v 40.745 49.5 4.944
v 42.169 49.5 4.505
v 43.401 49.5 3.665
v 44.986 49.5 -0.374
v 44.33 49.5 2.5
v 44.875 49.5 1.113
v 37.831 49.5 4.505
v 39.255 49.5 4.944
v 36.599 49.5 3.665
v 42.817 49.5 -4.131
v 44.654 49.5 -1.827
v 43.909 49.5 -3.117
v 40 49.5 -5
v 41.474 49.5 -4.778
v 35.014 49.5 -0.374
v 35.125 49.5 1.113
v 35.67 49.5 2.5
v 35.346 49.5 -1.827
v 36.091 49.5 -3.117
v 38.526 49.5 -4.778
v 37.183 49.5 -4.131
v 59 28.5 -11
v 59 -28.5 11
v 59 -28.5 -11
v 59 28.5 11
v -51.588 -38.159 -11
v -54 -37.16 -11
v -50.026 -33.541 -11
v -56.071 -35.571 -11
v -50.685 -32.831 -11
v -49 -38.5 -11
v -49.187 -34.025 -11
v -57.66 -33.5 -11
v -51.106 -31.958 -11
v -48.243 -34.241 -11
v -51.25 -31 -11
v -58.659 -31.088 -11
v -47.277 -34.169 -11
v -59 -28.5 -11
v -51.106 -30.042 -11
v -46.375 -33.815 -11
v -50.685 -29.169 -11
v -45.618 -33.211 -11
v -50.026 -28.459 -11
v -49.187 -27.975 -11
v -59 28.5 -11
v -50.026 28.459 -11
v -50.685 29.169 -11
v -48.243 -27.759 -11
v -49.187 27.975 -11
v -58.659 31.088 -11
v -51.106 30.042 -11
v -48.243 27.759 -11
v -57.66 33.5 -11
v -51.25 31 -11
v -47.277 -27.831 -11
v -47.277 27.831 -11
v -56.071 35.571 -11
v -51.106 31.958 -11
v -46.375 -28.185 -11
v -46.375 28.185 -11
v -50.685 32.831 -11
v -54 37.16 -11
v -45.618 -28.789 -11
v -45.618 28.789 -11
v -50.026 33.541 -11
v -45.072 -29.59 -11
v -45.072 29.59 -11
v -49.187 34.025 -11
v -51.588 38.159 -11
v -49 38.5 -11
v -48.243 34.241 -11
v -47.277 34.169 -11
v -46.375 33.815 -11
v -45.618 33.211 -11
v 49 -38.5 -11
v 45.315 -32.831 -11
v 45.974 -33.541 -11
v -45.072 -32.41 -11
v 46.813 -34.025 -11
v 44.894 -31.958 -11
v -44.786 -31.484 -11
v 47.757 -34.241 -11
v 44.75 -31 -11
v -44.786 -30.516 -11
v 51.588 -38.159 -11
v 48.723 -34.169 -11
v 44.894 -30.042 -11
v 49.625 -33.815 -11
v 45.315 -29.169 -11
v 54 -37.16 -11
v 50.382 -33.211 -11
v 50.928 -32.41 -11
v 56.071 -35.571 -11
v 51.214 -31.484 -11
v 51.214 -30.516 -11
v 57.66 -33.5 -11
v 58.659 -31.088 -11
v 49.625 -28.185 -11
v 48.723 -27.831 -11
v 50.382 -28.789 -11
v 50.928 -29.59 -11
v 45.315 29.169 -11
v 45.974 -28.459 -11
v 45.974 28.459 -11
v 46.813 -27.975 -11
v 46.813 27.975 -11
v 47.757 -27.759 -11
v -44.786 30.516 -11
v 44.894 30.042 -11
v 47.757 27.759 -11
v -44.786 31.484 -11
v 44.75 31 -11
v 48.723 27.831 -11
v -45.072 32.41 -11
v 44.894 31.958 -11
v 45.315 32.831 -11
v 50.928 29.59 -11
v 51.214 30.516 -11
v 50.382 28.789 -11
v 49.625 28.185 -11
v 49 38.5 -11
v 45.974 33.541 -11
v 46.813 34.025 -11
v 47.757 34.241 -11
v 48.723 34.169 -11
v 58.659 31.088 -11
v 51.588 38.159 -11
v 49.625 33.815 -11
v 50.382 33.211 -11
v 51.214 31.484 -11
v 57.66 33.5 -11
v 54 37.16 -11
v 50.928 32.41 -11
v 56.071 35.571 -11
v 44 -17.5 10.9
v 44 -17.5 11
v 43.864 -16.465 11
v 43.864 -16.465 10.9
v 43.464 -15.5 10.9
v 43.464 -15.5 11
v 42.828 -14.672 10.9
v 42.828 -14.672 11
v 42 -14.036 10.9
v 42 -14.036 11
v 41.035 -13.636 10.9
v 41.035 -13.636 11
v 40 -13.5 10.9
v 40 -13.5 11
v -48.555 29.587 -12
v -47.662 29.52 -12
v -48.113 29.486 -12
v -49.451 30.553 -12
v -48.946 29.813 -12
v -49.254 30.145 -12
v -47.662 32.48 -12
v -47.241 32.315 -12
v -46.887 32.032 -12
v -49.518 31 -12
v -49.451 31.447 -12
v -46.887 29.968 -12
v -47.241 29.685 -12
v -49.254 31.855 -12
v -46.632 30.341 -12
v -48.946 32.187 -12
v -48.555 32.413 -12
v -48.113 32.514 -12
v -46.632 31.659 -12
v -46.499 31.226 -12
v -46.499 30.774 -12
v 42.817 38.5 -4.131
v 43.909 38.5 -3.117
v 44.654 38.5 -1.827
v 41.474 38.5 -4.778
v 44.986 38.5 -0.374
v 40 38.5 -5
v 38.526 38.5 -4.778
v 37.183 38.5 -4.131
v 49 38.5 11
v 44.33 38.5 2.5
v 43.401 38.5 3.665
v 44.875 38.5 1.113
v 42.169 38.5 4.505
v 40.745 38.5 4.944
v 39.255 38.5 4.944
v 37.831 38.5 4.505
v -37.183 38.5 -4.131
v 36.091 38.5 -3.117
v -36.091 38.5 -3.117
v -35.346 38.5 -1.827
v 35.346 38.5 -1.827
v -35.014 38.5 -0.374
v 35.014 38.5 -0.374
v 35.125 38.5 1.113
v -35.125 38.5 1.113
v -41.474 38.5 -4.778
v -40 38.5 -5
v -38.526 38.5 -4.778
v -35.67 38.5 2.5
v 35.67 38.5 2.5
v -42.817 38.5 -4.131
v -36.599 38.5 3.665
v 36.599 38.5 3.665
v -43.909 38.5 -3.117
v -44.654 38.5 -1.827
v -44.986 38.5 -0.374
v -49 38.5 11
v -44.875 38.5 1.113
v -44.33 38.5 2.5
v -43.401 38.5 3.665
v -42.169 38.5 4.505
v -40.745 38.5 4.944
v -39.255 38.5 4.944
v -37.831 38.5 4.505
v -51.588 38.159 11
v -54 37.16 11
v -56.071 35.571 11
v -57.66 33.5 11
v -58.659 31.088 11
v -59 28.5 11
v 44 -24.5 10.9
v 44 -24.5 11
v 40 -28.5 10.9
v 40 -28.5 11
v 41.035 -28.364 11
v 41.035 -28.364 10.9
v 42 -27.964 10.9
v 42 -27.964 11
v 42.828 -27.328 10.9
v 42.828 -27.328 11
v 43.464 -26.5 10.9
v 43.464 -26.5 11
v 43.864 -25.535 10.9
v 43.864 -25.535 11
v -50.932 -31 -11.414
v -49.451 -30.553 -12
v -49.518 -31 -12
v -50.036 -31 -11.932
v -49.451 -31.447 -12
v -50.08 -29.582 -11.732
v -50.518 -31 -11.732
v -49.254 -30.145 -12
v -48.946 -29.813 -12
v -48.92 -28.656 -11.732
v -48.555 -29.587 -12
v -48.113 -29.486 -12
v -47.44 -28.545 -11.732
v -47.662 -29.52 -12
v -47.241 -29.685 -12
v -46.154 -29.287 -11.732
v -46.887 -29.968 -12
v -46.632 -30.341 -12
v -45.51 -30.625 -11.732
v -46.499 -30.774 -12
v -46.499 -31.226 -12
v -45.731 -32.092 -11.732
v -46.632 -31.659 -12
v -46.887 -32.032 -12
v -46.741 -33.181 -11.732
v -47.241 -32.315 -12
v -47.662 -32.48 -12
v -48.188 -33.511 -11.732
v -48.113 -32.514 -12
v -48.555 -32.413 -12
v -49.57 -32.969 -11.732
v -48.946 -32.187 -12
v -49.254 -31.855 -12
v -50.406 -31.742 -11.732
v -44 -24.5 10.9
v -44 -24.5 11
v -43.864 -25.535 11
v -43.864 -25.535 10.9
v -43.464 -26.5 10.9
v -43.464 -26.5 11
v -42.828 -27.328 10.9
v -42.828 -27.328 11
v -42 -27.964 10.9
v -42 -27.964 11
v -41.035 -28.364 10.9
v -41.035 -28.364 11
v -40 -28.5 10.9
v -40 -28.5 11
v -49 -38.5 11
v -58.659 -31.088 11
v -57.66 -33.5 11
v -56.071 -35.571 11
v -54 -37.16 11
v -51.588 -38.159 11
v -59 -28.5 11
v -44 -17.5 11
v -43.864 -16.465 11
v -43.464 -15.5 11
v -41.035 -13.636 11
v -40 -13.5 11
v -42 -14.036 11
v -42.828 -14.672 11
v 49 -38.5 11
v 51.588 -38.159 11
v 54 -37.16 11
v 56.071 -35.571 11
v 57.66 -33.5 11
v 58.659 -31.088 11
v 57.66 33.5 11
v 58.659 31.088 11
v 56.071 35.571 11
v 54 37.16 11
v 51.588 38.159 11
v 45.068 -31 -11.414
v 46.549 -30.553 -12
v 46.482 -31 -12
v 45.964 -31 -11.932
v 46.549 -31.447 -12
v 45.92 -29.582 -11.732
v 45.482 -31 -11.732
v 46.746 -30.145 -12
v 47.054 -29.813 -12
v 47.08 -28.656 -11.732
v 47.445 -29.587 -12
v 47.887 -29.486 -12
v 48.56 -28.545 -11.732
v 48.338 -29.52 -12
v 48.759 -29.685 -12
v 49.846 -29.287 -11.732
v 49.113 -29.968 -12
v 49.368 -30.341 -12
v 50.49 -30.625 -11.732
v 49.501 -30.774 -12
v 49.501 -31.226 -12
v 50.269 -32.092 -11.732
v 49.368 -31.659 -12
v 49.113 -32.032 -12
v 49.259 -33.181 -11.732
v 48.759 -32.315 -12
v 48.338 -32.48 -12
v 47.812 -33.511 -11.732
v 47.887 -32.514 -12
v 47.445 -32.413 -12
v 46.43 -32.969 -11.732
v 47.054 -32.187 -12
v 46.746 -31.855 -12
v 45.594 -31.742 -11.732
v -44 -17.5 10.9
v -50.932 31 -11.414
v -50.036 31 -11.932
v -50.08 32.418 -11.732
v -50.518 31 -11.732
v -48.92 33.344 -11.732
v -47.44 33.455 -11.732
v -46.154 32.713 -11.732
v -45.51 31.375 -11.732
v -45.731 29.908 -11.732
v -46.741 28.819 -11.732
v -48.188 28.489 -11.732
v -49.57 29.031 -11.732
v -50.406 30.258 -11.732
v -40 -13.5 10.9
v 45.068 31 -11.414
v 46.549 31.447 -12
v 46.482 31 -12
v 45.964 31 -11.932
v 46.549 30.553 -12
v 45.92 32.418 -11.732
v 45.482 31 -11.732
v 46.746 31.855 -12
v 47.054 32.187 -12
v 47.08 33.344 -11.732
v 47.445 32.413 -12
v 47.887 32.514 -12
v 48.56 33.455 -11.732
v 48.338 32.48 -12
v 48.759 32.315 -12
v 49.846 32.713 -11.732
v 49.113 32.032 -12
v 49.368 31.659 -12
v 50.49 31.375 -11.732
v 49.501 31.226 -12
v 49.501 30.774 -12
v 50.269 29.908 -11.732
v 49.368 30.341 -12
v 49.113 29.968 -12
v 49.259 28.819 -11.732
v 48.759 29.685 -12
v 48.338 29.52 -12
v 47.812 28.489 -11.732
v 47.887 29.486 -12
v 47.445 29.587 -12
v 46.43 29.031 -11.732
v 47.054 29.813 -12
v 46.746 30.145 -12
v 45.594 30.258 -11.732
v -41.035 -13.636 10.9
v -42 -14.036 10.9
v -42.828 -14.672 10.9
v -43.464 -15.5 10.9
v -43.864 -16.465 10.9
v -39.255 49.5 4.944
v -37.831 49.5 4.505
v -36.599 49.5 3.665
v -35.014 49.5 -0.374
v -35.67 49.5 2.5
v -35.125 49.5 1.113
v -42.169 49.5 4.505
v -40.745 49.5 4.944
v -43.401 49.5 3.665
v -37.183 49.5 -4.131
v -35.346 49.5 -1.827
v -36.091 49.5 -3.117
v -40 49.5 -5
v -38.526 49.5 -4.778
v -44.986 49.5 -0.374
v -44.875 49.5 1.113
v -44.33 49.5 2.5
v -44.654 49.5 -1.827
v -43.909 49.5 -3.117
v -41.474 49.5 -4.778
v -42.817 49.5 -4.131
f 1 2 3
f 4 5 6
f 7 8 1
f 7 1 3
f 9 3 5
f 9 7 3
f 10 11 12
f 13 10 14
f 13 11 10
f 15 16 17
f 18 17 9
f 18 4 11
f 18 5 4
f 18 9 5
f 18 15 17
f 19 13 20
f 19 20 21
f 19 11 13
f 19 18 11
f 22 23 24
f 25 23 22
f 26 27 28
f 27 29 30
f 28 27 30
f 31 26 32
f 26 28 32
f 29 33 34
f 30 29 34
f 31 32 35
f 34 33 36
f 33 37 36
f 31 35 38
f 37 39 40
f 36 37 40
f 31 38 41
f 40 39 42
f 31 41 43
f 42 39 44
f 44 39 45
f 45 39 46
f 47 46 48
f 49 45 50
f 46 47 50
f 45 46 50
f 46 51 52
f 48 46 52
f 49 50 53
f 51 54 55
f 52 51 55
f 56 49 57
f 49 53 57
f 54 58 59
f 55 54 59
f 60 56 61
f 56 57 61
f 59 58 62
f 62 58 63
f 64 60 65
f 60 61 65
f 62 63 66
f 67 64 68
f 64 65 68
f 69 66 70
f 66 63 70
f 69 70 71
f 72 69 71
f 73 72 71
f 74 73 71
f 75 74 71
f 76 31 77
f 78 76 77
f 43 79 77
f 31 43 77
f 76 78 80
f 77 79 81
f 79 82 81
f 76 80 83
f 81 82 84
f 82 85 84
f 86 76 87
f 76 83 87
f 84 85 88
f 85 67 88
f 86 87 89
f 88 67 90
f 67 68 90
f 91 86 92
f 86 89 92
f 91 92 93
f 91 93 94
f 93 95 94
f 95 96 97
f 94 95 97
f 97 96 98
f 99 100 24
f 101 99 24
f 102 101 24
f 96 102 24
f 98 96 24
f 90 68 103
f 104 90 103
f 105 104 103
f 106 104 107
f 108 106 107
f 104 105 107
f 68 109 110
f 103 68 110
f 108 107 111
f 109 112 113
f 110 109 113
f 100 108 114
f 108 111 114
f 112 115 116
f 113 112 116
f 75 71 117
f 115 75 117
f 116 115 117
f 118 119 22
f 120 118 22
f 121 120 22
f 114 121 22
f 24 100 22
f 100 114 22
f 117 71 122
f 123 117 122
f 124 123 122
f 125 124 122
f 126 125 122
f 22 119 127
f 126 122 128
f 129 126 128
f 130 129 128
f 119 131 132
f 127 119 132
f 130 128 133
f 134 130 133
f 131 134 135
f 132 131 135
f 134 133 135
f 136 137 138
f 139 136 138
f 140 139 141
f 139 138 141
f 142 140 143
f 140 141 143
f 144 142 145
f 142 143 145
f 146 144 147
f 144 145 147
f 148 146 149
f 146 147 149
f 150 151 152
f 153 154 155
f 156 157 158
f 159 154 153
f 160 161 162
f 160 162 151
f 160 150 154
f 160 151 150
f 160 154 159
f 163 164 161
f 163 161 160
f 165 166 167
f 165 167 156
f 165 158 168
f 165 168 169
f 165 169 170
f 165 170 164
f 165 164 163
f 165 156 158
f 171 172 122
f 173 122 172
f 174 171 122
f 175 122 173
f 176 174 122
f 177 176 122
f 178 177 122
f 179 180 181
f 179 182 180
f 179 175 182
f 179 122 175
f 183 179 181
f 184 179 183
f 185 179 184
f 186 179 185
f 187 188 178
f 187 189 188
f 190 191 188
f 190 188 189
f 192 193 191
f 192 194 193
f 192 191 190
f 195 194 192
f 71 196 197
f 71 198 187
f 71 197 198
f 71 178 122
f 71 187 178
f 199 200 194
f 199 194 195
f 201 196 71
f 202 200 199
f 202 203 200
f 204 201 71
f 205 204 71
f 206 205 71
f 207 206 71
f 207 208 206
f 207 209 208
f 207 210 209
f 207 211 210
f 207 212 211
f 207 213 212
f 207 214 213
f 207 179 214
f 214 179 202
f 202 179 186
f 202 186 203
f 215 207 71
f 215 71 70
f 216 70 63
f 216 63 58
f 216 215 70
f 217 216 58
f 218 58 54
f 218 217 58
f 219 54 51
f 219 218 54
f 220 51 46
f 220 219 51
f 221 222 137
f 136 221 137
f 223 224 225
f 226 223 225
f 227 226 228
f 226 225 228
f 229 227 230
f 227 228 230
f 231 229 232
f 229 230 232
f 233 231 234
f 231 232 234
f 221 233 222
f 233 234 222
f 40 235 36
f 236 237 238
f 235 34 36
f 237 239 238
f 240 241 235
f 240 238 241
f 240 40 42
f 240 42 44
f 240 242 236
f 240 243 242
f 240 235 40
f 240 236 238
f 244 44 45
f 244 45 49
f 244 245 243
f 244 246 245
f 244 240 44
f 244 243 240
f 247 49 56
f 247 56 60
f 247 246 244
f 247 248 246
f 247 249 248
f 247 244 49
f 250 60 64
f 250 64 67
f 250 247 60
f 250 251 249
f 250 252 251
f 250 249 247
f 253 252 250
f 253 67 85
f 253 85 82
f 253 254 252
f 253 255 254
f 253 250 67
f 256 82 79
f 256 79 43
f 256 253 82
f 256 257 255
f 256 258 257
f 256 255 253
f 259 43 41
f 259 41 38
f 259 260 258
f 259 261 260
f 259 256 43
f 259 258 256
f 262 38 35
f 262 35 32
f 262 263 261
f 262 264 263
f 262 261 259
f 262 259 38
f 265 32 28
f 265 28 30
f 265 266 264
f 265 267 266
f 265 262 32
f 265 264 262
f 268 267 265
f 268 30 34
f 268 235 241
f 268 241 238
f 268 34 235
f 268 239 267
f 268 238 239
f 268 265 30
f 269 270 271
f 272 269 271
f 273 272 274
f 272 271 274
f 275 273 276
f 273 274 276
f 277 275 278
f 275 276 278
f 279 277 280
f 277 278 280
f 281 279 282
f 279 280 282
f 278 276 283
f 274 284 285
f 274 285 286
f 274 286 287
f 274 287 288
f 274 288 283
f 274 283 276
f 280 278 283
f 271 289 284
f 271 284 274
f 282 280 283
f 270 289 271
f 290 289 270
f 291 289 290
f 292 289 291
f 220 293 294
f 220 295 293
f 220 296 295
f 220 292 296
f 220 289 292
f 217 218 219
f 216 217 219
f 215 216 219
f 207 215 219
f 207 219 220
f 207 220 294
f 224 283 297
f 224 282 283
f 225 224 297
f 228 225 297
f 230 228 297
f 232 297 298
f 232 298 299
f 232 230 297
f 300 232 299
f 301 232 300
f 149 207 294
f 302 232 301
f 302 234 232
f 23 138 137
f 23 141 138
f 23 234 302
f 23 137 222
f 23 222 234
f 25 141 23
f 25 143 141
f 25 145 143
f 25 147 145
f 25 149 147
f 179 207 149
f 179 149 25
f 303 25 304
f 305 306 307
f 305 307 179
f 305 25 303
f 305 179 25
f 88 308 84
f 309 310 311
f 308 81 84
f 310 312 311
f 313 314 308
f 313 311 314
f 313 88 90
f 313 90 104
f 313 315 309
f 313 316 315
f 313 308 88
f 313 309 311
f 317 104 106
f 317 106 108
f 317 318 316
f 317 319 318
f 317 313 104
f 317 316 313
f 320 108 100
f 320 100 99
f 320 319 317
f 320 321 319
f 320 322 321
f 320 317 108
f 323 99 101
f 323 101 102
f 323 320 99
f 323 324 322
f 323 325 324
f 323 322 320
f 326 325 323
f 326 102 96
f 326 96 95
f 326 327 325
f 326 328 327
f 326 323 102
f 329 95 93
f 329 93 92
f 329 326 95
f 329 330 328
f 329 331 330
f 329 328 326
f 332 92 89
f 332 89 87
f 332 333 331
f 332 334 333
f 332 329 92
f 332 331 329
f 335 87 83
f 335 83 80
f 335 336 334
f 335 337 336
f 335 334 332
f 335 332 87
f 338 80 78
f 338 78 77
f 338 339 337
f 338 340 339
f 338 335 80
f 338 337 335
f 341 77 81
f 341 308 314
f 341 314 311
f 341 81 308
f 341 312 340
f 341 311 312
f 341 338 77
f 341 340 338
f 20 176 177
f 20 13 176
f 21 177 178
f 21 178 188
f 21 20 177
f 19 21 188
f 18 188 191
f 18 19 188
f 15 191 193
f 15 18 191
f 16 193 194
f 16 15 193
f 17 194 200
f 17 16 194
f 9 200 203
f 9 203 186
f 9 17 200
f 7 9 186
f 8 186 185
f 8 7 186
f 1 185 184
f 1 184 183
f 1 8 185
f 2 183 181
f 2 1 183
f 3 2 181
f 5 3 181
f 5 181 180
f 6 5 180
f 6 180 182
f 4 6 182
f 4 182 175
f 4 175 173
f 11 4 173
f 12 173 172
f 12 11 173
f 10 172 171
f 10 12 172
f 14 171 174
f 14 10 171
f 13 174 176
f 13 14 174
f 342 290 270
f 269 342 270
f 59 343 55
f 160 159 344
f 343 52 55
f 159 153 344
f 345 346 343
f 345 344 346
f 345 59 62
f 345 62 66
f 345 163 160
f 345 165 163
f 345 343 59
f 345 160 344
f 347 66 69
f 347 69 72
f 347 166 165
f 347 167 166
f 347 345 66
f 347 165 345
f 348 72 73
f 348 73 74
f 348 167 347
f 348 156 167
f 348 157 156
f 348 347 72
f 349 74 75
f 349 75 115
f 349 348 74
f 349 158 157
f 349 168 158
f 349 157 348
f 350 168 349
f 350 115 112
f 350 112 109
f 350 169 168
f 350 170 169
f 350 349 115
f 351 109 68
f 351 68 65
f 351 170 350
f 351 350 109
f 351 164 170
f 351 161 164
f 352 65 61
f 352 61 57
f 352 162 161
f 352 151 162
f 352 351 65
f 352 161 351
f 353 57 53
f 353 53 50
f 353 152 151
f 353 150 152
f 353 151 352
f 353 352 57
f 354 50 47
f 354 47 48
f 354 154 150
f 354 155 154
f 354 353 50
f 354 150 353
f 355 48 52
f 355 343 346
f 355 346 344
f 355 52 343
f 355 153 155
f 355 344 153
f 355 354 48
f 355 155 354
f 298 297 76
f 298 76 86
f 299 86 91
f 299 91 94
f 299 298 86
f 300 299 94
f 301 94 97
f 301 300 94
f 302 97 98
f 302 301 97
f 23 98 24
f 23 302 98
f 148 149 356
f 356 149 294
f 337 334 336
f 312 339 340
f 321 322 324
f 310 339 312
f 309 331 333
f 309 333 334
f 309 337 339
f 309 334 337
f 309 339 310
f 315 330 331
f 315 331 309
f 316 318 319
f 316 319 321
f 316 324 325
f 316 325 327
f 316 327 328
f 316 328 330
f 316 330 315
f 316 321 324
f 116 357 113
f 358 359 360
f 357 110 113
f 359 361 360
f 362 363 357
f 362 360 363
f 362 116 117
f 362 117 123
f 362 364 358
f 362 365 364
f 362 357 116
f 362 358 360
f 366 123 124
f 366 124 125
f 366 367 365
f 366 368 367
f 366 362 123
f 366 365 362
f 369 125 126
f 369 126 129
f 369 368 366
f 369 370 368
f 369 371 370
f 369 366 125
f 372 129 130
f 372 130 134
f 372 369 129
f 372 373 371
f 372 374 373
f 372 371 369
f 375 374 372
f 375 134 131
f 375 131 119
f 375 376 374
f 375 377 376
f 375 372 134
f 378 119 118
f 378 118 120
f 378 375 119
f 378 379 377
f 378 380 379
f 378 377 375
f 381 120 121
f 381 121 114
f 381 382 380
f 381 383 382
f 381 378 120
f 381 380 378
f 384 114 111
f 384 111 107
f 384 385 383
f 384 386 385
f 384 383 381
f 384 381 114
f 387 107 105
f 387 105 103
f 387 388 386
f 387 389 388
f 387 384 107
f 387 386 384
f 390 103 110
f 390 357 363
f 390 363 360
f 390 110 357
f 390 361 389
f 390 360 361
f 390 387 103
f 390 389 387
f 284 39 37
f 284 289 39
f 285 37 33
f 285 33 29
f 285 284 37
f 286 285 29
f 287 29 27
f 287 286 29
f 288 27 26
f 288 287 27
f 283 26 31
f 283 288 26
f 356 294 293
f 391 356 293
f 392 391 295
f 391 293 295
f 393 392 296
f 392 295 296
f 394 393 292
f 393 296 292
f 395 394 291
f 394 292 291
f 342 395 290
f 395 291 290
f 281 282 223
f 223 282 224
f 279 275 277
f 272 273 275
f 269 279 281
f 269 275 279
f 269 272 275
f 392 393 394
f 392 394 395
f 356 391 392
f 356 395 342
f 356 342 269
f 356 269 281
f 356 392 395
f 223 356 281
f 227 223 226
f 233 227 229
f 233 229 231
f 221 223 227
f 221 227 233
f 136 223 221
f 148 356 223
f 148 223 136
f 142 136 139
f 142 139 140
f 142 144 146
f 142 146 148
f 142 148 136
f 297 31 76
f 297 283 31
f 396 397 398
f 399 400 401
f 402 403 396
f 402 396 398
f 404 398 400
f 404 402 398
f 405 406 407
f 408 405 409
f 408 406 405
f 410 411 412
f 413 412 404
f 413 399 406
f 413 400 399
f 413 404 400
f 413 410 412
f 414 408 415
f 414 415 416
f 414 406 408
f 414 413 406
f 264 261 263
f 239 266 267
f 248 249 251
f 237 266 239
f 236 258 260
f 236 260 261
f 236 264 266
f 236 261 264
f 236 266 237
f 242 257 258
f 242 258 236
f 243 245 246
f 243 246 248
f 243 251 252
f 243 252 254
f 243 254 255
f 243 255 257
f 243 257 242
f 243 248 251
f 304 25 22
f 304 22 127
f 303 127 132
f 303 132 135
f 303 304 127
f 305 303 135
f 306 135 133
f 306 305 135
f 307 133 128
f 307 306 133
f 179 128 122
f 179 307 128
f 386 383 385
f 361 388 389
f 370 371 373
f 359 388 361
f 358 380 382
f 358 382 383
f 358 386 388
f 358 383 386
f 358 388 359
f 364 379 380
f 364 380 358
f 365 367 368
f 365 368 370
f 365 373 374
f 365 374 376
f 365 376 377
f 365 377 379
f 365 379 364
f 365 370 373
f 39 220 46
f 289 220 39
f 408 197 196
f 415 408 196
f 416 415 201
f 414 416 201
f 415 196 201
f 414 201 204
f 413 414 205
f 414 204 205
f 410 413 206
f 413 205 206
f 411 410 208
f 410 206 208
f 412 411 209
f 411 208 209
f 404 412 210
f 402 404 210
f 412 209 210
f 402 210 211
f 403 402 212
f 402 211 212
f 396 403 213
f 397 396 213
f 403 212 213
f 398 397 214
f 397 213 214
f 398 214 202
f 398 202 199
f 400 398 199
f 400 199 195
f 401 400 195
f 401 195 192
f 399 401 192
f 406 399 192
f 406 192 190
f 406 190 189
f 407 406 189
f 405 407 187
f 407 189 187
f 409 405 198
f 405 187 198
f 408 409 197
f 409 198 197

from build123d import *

# Parameters (mm, degrees)
BOSS_EXTRUDE1_DEPTH = 11
SKETCH2_R           = 5
BOSS_EXTRUDE2_DEPTH = 11
SKETCH3_R           = 3.25
BOSS_EXTRUDE3_DEPTH = 1
FILLET1_R           = 2
CUT_EXTRUDE1_DEPTH  = 0.1


with BuildPart() as part:
    # Sketch1 → Boss-Extrude1 (new, symmetric)
    with BuildSketch(Plane.XY):
        with BuildLine():
            Line((-49, -38.5), (49, -38.5))
            ThreePointArc((49, -38.5), (56.071067812, -35.571067812), (59, -28.5))
            Line((59, -28.5), (59, 28.5))
            ThreePointArc((59, 28.5), (56.071067812, 35.571067812), (49, 38.5))
            Line((49, 38.5), (-49, 38.5))
            ThreePointArc((-49, 38.5), (-56.071067812, 35.571067812), (-59, 28.5))
            Line((-59, 28.5), (-59, -28.5))
            ThreePointArc((-59, -28.5), (-56.071067812, -35.571067812), (-49, -38.5))
        make_face()
    extrude(amount=BOSS_EXTRUDE1_DEPTH, both=True)

    # Sketch2 → Boss-Extrude2 (add, symmetric)
    with BuildSketch(Plane(origin=(0, 38.5, 0), x_dir=(1, 0, 0), z_dir=(0, 1, 0))):
        with Locations(Location((-40, 0, 0), (0, 0, 90))):
            Circle(SKETCH2_R)
        with Locations(Location((40, 0, 0), (0, 0, 90))):
            Circle(SKETCH2_R)
    extrude(amount=BOSS_EXTRUDE2_DEPTH, both=True)

    # Sketch3 → Boss-Extrude3 (add, symmetric)
    with BuildSketch(Plane(origin=(0, 0, -11), x_dir=(-1, 0, 0), z_dir=(0, 0, -1))):
        with Locations((-48, 31)):
            Circle(SKETCH3_R)
        with Locations((-48, -31)):
            Circle(SKETCH3_R)
        with Locations((48, -31)):
            Circle(SKETCH3_R)
        with Locations((48, 31)):
            Circle(SKETCH3_R)
    extrude(amount=BOSS_EXTRUDE3_DEPTH, both=True)

    # Fillet1
    # the kernel refuses this fillet: 2 mm, written as the material it takes off along each edge
    with BuildSketch(Plane(origin=(48, 31, -12), x_dir=(-1, 0, 0), z_dir=(0, -1, 0))) as fillet1_piece_1:
        with BuildLine():
            CenterArc((1.517949192, -2), FILLET1_R, 30, 60)
            Line((1.517949192, 0), (1.517949192, 0.04))
            Line((1.517949192, 0.04), (3.25, 0.04))
            Line((3.25, 0.04), (3.29, 0))
            ThreePointArc((3.29, 0), (3.29, -0.5), (3.284641016, -0.98))
            Line((3.284641016, -0.98), (3.25, -1))
        make_face()
    revolve(axis=Axis((48, 31, -12), (0, 0, -1)), mode=Mode.SUBTRACT)
    with BuildSketch(Plane(origin=(48, -31, -12), x_dir=(-1, 0, 0), z_dir=(0, -1, 0))) as fillet1_piece_2:
        with BuildLine():
            CenterArc((1.517949192, -2), FILLET1_R, 30, 60)
            Line((1.517949192, 0), (1.517949192, 0.04))
            Line((1.517949192, 0.04), (3.25, 0.04))
            Line((3.25, 0.04), (3.29, 0))
            ThreePointArc((3.29, 0), (3.29, -0.5), (3.284641016, -0.98))
            Line((3.284641016, -0.98), (3.25, -1))
        make_face()
    revolve(axis=Axis((48, -31, -12), (0, 0, -1)), mode=Mode.SUBTRACT)
    with BuildSketch(Plane(origin=(-48, -31, -12), x_dir=(-1, 0, 0), z_dir=(0, -1, 0))) as fillet1_piece_3:
        with BuildLine():
            CenterArc((1.517949192, -2), FILLET1_R, 30, 60)
            Line((1.517949192, 0), (1.517949192, 0.04))
            Line((1.517949192, 0.04), (3.25, 0.04))
            Line((3.25, 0.04), (3.29, 0))
            ThreePointArc((3.29, 0), (3.29, -0.5), (3.284641016, -0.98))
            Line((3.284641016, -0.98), (3.25, -1))
        make_face()
    revolve(axis=Axis((-48, -31, -12), (0, 0, -1)), mode=Mode.SUBTRACT)
    with BuildSketch(Plane(origin=(-48, 31, -12), x_dir=(-1, 0, 0), z_dir=(0, -1, 0))) as fillet1_piece_4:
        with BuildLine():
            CenterArc((1.517949192, -2), FILLET1_R, 30, 60)
            Line((1.517949192, 0), (1.517949192, 0.04))
            Line((1.517949192, 0.04), (3.25, 0.04))
            Line((3.25, 0.04), (3.29, 0))
            ThreePointArc((3.29, 0), (3.29, -0.5), (3.284641016, -0.98))
            Line((3.284641016, -0.98), (3.25, -1))
        make_face()
    revolve(axis=Axis((-48, 31, -12), (0, 0, -1)), mode=Mode.SUBTRACT)

    # Sketch4 → Cut-Extrude1 (cut)
    with BuildSketch(Plane.XY.offset(11)):
        with BuildLine():
            Line((-40, -28.5), (40, -28.5))
            ThreePointArc((40, -28.5), (42.828427125, -27.328427125), (44, -24.5))
            Line((44, -24.5), (44, -17.5))
            ThreePointArc((44, -17.5), (42.828427125, -14.671572875), (40, -13.5))
            Line((40, -13.5), (-40, -13.5))
            ThreePointArc((-40, -13.5), (-42.828427125, -14.671572875), (-44, -17.5))
            Line((-44, -17.5), (-44, -24.5))
            ThreePointArc((-44, -24.5), (-42.828427125, -27.328427125), (-40, -28.5))
        make_face()
    extrude(amount=-CUT_EXTRUDE1_DEPTH, mode=Mode.SUBTRACT)


solid = part.part
